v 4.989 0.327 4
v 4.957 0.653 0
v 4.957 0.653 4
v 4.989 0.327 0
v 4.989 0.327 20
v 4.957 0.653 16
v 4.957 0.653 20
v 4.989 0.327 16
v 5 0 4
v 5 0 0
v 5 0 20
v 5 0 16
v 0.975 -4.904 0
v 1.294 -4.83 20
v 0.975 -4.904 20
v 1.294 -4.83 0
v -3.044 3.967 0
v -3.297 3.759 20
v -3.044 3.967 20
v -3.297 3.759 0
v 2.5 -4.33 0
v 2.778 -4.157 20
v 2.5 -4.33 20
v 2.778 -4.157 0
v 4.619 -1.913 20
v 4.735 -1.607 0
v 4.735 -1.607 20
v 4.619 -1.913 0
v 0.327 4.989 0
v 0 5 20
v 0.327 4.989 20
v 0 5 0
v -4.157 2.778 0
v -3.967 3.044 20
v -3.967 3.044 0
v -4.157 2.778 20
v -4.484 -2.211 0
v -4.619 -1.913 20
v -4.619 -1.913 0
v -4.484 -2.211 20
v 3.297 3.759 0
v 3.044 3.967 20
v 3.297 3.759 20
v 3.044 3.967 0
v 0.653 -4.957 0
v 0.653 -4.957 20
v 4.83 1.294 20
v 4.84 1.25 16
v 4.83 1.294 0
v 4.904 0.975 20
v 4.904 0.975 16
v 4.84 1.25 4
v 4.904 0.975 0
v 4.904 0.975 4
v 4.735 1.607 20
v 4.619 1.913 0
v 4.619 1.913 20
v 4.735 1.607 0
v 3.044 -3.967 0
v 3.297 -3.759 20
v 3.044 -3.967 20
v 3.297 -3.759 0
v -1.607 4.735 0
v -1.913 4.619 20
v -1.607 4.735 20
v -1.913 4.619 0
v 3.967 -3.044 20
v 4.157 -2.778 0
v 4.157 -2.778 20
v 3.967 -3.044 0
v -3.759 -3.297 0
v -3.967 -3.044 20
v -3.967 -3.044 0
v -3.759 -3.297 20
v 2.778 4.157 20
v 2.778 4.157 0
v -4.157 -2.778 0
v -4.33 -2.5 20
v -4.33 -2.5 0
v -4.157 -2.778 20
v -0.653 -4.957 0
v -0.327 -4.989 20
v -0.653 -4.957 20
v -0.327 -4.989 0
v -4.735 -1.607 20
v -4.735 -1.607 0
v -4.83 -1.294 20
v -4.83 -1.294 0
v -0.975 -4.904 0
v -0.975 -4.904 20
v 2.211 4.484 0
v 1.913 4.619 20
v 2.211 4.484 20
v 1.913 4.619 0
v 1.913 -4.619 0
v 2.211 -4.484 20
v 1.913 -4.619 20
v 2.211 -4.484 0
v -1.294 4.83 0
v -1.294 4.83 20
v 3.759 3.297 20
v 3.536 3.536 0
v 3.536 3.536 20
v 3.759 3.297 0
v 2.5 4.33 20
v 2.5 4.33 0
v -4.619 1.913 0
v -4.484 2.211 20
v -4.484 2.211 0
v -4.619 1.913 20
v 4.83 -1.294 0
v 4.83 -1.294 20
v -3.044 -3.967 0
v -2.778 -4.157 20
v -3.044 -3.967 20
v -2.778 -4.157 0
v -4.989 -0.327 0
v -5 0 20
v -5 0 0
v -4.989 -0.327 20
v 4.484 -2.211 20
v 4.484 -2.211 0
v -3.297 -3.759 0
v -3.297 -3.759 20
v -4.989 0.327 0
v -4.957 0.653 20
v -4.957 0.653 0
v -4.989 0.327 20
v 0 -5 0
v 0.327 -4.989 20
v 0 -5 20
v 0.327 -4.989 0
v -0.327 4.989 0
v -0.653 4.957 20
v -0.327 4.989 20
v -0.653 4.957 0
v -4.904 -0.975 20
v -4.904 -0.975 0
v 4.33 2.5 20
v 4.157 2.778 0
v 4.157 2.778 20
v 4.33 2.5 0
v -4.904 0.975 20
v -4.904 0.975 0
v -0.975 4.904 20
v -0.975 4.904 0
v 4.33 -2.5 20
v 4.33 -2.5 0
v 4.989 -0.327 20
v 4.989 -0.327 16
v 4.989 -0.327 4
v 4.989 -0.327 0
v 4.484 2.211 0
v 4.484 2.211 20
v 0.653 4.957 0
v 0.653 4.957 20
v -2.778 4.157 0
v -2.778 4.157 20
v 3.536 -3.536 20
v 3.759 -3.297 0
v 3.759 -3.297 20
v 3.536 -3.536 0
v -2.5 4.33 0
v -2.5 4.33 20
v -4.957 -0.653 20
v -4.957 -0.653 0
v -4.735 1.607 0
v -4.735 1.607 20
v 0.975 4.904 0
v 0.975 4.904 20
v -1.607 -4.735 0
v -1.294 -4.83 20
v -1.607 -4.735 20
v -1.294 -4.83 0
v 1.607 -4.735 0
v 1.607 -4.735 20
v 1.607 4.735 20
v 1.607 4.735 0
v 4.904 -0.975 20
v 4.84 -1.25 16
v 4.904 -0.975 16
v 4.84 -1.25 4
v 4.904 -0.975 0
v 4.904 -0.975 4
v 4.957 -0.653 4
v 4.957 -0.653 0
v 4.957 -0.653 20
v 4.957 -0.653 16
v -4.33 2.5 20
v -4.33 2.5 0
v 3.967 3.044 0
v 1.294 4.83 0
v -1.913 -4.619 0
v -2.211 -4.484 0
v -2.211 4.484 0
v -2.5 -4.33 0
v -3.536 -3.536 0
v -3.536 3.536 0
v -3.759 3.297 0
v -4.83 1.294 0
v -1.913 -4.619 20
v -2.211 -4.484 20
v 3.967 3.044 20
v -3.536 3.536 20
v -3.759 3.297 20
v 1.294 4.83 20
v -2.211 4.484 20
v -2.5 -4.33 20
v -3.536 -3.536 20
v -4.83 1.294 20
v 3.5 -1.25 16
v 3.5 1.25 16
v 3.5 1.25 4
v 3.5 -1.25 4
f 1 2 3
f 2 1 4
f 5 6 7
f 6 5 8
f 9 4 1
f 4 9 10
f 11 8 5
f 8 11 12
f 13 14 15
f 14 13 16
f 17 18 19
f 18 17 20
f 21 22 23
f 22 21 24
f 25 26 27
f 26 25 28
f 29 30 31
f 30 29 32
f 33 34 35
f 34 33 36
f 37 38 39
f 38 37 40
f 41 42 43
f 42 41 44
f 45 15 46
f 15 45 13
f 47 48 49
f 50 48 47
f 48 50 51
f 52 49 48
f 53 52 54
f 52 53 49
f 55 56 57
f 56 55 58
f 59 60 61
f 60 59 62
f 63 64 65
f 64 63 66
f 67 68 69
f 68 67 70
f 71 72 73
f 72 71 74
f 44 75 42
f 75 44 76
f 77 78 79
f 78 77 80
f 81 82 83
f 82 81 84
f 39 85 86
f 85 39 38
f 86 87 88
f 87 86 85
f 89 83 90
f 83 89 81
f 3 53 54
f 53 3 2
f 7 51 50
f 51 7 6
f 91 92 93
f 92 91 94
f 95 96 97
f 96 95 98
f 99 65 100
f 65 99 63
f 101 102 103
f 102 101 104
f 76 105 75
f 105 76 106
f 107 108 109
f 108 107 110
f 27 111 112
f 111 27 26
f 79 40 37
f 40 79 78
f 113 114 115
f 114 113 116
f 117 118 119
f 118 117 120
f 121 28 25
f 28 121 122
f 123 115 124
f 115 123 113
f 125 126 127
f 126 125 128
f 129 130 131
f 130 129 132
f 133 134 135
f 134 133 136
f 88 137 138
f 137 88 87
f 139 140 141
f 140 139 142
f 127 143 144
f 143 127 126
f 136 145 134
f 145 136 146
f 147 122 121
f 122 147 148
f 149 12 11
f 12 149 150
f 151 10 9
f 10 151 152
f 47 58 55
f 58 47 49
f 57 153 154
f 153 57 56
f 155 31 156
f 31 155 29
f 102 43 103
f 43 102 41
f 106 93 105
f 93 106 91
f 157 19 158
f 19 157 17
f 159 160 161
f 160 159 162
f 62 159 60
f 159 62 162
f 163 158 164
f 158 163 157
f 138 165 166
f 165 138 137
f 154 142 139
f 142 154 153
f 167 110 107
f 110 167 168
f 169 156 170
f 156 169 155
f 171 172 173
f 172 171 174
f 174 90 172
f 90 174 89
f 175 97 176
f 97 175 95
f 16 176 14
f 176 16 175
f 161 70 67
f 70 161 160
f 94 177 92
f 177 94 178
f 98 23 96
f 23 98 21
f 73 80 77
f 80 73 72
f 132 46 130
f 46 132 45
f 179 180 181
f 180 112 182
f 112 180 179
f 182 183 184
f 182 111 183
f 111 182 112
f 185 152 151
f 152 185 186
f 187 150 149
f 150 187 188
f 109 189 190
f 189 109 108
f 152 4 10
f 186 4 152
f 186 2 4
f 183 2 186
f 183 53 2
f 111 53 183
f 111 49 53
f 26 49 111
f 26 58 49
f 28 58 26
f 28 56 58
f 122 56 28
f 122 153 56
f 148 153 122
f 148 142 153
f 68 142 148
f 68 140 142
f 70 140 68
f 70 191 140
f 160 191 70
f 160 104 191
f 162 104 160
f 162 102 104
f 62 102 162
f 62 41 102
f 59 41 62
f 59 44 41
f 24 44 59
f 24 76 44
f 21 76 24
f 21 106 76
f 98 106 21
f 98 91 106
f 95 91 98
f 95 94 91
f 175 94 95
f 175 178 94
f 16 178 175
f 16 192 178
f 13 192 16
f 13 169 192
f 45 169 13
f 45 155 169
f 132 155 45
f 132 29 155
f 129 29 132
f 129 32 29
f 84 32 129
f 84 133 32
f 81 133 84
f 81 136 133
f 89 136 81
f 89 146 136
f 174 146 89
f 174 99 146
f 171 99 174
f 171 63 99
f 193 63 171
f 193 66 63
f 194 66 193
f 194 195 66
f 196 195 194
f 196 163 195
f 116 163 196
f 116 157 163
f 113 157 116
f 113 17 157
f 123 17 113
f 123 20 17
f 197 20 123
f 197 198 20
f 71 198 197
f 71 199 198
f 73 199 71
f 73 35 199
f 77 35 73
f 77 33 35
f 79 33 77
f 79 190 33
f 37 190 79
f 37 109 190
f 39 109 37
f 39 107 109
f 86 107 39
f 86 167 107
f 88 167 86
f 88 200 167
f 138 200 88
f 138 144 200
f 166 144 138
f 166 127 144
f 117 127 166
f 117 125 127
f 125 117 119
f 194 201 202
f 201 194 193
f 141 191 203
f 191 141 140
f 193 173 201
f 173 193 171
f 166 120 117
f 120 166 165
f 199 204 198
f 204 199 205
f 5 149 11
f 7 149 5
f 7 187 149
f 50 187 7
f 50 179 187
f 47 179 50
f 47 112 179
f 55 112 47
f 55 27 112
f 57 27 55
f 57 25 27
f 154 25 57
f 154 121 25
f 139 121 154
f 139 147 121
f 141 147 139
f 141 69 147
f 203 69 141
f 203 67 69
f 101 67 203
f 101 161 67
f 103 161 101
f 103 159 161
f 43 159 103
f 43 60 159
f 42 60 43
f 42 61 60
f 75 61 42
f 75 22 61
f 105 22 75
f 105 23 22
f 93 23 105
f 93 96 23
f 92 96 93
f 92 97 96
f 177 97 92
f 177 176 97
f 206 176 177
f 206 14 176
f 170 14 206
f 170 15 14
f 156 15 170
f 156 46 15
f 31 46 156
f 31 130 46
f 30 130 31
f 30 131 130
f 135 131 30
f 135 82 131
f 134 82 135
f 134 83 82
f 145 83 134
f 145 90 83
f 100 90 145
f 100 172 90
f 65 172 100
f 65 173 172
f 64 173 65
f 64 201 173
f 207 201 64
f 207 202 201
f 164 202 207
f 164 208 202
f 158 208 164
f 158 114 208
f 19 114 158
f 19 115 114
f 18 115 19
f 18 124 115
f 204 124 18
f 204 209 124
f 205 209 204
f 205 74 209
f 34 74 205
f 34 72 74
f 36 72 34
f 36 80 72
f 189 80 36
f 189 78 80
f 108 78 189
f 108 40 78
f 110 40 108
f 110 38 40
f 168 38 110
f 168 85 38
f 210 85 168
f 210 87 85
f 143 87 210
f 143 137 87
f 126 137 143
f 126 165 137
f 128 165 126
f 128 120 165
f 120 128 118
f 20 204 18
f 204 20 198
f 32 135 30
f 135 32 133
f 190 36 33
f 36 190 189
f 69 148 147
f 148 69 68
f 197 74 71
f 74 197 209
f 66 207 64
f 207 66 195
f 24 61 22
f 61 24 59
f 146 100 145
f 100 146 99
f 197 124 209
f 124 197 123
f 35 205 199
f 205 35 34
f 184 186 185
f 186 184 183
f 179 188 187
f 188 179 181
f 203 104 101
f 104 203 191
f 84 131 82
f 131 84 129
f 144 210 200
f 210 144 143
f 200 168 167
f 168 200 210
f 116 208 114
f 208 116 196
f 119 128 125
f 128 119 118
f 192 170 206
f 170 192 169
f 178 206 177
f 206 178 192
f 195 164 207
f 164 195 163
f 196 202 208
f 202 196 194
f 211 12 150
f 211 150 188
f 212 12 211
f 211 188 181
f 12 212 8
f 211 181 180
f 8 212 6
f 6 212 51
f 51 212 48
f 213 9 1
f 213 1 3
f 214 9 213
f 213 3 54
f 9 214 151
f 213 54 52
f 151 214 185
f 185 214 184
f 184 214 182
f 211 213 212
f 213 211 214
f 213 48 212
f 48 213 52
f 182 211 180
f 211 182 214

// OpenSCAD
// Auto-generated from tests/data/feature_fixtures_manifest.json
// fixture: non_revolve_shaft_with_keyway
// fixture_type: non_revolve
// description: Near-axisymmetric shaft with one axial keyway slot.
$fn = 96;

diameter = 10.000000;
height = 20.000000;
keyway_width = 2.500000;
keyway_depth = 1.500000;

difference() {
    cylinder(h=height, d=diameter, center=false);
    translate([diameter/2 - keyway_depth, -keyway_width/2, height*0.2])
        cube([keyway_depth + 0.1, keyway_width, height*0.6]);
}
